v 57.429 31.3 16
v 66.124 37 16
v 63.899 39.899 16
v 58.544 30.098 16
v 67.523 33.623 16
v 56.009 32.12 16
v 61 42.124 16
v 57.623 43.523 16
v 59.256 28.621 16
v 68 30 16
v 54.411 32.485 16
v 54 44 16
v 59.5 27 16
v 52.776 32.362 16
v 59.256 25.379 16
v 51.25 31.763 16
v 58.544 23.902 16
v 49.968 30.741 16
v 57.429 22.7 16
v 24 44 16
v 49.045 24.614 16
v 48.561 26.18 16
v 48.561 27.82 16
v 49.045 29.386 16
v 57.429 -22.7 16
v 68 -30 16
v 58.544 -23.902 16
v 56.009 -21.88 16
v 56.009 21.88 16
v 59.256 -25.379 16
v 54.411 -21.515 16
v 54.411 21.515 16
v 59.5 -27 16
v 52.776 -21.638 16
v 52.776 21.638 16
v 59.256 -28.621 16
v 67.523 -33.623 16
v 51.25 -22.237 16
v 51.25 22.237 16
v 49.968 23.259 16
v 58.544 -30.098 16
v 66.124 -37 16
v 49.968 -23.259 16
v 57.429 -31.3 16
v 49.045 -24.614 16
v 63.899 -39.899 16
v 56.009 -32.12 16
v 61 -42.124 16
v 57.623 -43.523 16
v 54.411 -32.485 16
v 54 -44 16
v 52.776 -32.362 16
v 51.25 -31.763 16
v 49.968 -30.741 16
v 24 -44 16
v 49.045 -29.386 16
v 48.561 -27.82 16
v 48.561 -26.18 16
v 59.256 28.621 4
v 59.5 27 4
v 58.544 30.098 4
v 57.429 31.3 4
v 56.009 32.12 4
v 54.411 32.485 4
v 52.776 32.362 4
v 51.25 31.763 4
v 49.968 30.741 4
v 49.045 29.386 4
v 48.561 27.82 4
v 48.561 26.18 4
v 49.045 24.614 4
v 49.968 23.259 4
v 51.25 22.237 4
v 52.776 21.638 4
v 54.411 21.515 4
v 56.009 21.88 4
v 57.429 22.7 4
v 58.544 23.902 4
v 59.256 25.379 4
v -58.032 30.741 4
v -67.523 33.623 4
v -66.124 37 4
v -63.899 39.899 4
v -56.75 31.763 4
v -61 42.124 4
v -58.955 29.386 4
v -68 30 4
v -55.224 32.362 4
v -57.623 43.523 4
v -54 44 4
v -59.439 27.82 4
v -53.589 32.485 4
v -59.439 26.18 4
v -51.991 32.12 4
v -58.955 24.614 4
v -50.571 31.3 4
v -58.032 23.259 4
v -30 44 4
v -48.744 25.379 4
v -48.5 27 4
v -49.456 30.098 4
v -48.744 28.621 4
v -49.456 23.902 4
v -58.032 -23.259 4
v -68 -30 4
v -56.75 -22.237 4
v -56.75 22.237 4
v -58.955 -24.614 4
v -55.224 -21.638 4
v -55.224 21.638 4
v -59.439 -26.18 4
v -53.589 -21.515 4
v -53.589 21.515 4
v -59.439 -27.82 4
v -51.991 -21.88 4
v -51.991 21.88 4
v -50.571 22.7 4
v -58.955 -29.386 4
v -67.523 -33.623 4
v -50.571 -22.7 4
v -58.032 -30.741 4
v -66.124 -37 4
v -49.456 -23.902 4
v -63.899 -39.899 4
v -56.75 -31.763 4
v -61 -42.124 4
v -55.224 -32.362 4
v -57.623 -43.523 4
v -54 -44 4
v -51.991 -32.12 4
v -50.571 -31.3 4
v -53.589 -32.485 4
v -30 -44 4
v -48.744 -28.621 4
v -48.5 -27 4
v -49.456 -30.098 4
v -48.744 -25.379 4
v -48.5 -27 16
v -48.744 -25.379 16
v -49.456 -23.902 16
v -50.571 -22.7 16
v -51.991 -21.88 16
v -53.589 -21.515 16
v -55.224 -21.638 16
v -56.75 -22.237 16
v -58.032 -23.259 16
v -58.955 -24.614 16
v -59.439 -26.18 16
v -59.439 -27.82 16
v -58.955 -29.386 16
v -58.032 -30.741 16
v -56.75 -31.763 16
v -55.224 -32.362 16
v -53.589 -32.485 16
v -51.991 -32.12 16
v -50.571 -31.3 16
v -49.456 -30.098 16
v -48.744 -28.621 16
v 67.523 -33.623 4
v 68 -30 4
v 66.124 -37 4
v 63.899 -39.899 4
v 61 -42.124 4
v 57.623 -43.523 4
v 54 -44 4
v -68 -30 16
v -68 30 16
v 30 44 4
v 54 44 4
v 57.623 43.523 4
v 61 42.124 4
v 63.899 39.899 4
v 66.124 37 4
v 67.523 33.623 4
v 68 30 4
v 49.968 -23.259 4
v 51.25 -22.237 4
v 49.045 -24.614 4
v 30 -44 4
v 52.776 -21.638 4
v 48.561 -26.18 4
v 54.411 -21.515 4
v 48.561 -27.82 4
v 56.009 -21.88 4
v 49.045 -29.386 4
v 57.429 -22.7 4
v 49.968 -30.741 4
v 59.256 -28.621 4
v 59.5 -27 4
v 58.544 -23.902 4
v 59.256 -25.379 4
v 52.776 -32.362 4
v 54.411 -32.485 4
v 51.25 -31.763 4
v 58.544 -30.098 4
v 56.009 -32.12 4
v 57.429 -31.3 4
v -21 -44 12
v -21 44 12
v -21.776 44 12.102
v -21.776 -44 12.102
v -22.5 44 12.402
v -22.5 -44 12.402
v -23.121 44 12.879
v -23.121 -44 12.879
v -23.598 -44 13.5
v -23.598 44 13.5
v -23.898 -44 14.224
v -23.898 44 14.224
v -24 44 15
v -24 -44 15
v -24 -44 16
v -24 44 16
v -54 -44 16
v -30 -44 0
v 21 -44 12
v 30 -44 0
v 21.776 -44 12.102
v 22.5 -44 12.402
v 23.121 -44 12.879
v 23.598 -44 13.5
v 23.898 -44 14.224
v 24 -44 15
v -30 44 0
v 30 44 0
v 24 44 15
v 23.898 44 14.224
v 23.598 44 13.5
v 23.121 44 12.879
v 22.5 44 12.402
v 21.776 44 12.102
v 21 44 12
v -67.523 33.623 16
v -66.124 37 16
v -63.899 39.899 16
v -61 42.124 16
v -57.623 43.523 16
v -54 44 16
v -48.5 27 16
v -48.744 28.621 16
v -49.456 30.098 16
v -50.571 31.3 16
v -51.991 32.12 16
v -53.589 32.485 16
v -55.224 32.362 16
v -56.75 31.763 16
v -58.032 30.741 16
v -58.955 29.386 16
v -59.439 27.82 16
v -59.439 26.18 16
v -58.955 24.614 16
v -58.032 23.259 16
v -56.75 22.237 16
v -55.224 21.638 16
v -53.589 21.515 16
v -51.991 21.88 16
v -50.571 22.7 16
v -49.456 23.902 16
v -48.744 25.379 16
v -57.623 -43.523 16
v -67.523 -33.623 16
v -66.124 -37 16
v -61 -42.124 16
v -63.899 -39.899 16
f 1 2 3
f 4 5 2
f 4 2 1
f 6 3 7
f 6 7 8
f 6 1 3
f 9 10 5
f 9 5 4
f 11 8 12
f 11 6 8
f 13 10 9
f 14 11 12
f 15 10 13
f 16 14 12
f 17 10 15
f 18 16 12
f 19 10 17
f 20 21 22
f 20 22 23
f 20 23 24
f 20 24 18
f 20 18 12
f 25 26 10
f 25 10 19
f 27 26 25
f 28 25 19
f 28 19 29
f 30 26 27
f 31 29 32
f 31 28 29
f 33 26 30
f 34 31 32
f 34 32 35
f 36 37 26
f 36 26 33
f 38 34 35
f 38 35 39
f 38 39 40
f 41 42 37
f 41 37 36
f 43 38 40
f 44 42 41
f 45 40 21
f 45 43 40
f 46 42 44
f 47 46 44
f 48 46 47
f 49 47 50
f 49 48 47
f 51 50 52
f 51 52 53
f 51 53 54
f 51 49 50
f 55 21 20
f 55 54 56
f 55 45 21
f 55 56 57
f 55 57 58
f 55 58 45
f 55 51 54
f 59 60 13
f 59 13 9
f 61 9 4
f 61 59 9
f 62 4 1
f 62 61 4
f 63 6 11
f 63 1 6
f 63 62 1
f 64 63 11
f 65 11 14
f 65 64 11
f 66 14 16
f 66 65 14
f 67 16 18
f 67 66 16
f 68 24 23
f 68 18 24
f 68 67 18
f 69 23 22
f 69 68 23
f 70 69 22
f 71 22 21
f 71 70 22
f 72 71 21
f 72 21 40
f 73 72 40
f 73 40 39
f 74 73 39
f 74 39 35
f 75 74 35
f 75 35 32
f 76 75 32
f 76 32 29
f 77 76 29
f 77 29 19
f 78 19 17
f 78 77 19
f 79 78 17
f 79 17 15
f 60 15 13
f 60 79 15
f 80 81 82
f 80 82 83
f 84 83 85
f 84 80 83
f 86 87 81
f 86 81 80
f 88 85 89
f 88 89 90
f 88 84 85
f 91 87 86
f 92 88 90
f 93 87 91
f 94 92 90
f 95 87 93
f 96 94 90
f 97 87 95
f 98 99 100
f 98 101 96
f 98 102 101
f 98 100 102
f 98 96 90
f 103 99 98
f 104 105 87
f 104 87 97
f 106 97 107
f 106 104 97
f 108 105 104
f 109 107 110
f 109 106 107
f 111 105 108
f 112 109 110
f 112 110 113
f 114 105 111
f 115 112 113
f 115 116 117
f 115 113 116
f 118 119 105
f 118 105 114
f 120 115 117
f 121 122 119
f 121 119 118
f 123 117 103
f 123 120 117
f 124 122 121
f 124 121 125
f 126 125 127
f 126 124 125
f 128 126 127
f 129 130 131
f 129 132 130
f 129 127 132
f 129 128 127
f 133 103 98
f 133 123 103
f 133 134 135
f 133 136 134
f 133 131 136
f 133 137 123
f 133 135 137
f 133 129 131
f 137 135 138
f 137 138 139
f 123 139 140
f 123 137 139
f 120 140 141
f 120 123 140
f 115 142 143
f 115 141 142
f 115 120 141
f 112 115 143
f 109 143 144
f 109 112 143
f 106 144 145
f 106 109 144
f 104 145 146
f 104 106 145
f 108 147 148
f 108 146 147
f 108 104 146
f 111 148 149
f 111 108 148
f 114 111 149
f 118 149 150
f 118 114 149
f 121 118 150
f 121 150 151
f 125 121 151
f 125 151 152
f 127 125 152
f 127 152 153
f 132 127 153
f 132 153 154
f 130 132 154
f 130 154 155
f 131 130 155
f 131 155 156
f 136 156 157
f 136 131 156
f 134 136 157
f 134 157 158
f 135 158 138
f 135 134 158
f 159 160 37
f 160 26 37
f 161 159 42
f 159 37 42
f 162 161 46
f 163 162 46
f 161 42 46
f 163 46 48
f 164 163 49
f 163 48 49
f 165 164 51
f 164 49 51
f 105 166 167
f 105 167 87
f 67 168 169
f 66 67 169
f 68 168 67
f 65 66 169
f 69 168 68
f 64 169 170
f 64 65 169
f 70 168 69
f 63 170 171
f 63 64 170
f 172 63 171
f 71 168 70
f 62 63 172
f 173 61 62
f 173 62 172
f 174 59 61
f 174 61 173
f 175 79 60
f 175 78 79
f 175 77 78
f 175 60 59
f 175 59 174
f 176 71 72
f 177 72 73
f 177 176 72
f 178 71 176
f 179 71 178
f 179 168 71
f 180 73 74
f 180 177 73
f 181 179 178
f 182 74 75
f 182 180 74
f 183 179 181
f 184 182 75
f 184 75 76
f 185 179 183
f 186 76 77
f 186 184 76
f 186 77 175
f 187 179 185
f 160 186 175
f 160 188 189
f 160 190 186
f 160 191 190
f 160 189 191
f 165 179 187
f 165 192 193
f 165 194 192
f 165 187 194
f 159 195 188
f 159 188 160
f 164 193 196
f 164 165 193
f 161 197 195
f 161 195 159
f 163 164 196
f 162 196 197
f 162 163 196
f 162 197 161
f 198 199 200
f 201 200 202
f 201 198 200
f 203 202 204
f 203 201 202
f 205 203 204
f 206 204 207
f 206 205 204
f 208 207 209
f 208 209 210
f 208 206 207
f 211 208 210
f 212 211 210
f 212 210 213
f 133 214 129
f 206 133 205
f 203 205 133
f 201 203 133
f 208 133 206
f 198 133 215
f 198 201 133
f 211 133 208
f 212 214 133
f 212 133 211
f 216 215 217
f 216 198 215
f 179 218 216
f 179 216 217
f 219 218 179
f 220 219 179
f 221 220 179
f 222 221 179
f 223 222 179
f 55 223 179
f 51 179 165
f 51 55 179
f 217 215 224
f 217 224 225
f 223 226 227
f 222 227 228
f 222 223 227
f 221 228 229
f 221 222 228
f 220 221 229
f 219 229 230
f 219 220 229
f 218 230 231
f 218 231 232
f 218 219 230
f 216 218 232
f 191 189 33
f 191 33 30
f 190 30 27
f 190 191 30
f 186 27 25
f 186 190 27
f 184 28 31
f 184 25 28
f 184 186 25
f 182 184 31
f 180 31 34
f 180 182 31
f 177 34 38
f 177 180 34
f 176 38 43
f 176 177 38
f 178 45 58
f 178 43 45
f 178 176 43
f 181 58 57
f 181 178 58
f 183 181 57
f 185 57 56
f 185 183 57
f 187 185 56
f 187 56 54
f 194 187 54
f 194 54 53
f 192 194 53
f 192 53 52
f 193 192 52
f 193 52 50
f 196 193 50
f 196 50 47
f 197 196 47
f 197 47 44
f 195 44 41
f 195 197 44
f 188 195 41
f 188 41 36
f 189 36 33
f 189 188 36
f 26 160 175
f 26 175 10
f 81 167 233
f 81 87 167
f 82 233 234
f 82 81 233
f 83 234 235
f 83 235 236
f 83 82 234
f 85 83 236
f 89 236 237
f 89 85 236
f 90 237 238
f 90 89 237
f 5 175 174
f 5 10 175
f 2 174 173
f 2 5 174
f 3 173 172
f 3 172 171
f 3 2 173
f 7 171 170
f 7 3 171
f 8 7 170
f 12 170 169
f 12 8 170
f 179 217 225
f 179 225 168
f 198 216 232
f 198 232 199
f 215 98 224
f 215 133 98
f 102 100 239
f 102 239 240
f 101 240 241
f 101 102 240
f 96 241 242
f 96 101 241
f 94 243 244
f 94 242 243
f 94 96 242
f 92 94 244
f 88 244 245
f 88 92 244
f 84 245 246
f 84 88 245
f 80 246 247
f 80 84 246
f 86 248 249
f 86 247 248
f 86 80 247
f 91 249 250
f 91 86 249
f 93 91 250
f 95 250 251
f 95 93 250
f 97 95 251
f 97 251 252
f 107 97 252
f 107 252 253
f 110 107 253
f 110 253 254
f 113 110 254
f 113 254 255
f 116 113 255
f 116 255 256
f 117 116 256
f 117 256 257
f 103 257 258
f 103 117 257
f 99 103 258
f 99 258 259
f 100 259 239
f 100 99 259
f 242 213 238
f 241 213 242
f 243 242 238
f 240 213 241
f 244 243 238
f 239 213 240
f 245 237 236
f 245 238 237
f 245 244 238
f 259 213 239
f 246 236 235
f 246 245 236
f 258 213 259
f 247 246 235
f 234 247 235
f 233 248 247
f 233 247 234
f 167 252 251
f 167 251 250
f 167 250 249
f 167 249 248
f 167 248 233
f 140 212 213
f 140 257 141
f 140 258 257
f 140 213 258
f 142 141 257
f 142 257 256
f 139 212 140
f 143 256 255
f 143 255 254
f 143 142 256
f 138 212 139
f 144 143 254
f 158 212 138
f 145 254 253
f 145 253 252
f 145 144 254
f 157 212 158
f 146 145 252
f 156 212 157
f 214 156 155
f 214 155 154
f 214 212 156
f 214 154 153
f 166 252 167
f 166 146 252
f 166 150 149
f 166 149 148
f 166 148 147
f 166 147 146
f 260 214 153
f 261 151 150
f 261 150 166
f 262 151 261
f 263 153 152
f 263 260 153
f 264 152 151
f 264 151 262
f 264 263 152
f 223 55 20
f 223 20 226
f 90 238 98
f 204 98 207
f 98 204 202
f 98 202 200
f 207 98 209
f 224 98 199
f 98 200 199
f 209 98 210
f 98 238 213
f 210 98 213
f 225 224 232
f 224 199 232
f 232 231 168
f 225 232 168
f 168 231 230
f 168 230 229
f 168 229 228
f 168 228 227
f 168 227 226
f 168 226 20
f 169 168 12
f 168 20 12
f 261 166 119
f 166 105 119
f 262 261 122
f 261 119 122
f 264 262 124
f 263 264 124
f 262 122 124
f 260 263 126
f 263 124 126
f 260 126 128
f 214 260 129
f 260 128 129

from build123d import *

# Parameters (mm, degrees)
F1_DEPTH = 44
F2_R     = 14
F3_R     = 5.5
F4_DEPTH = 16.001


with BuildPart() as f1:
    # F0 (on Front) → F1 (new body, symmetric)
    with BuildSketch(Plane.XZ):
        with BuildLine():
            Line((-30, 4), (-30, 0))
            Line((-30, 0), (30, 0))
            Line((30, 0), (30, 4))
            Line((30, 4), (68, 4))
            Line((68, 4), (68, 16))
            Line((68, 16), (24, 16))
            Line((24, 16), (24, 15))
            ThreePointArc((24, 15), (23.12132, 12.87868), (21, 12))
            Line((21, 12), (-21, 12))
            ThreePointArc((-21, 12), (-23.12132, 12.87868), (-24, 15))
            Line((-24, 15), (-24, 16))
            Line((-24, 16), (-68, 16))
            Line((-68, 16), (-68, 4))
            Line((-68, 4), (-30, 4))
        make_face()
    extrude(amount=F1_DEPTH, both=True)

    # F2
    f2_edges = [f1.edges().sort_by_distance(p)[0] for p in [
        (-68, -44, 10),
        (-68, 44, 10),
        (68, 44, 10),
        (68, -44, 10),
    ]]
    fillet(f2_edges, radius=F2_R)

    # F3 (on Top) → F4 (cut, through all)
    with BuildSketch(Plane.XY):
        with Locations((-54, 27)):
            Circle(F3_R)
        with Locations((-54, -27)):
            Circle(F3_R)
        with Locations((54, 27)):
            Circle(F3_R)
        with Locations((54, -27)):
            Circle(F3_R)
    extrude(amount=F4_DEPTH, mode=Mode.SUBTRACT)


solid = f1.part
